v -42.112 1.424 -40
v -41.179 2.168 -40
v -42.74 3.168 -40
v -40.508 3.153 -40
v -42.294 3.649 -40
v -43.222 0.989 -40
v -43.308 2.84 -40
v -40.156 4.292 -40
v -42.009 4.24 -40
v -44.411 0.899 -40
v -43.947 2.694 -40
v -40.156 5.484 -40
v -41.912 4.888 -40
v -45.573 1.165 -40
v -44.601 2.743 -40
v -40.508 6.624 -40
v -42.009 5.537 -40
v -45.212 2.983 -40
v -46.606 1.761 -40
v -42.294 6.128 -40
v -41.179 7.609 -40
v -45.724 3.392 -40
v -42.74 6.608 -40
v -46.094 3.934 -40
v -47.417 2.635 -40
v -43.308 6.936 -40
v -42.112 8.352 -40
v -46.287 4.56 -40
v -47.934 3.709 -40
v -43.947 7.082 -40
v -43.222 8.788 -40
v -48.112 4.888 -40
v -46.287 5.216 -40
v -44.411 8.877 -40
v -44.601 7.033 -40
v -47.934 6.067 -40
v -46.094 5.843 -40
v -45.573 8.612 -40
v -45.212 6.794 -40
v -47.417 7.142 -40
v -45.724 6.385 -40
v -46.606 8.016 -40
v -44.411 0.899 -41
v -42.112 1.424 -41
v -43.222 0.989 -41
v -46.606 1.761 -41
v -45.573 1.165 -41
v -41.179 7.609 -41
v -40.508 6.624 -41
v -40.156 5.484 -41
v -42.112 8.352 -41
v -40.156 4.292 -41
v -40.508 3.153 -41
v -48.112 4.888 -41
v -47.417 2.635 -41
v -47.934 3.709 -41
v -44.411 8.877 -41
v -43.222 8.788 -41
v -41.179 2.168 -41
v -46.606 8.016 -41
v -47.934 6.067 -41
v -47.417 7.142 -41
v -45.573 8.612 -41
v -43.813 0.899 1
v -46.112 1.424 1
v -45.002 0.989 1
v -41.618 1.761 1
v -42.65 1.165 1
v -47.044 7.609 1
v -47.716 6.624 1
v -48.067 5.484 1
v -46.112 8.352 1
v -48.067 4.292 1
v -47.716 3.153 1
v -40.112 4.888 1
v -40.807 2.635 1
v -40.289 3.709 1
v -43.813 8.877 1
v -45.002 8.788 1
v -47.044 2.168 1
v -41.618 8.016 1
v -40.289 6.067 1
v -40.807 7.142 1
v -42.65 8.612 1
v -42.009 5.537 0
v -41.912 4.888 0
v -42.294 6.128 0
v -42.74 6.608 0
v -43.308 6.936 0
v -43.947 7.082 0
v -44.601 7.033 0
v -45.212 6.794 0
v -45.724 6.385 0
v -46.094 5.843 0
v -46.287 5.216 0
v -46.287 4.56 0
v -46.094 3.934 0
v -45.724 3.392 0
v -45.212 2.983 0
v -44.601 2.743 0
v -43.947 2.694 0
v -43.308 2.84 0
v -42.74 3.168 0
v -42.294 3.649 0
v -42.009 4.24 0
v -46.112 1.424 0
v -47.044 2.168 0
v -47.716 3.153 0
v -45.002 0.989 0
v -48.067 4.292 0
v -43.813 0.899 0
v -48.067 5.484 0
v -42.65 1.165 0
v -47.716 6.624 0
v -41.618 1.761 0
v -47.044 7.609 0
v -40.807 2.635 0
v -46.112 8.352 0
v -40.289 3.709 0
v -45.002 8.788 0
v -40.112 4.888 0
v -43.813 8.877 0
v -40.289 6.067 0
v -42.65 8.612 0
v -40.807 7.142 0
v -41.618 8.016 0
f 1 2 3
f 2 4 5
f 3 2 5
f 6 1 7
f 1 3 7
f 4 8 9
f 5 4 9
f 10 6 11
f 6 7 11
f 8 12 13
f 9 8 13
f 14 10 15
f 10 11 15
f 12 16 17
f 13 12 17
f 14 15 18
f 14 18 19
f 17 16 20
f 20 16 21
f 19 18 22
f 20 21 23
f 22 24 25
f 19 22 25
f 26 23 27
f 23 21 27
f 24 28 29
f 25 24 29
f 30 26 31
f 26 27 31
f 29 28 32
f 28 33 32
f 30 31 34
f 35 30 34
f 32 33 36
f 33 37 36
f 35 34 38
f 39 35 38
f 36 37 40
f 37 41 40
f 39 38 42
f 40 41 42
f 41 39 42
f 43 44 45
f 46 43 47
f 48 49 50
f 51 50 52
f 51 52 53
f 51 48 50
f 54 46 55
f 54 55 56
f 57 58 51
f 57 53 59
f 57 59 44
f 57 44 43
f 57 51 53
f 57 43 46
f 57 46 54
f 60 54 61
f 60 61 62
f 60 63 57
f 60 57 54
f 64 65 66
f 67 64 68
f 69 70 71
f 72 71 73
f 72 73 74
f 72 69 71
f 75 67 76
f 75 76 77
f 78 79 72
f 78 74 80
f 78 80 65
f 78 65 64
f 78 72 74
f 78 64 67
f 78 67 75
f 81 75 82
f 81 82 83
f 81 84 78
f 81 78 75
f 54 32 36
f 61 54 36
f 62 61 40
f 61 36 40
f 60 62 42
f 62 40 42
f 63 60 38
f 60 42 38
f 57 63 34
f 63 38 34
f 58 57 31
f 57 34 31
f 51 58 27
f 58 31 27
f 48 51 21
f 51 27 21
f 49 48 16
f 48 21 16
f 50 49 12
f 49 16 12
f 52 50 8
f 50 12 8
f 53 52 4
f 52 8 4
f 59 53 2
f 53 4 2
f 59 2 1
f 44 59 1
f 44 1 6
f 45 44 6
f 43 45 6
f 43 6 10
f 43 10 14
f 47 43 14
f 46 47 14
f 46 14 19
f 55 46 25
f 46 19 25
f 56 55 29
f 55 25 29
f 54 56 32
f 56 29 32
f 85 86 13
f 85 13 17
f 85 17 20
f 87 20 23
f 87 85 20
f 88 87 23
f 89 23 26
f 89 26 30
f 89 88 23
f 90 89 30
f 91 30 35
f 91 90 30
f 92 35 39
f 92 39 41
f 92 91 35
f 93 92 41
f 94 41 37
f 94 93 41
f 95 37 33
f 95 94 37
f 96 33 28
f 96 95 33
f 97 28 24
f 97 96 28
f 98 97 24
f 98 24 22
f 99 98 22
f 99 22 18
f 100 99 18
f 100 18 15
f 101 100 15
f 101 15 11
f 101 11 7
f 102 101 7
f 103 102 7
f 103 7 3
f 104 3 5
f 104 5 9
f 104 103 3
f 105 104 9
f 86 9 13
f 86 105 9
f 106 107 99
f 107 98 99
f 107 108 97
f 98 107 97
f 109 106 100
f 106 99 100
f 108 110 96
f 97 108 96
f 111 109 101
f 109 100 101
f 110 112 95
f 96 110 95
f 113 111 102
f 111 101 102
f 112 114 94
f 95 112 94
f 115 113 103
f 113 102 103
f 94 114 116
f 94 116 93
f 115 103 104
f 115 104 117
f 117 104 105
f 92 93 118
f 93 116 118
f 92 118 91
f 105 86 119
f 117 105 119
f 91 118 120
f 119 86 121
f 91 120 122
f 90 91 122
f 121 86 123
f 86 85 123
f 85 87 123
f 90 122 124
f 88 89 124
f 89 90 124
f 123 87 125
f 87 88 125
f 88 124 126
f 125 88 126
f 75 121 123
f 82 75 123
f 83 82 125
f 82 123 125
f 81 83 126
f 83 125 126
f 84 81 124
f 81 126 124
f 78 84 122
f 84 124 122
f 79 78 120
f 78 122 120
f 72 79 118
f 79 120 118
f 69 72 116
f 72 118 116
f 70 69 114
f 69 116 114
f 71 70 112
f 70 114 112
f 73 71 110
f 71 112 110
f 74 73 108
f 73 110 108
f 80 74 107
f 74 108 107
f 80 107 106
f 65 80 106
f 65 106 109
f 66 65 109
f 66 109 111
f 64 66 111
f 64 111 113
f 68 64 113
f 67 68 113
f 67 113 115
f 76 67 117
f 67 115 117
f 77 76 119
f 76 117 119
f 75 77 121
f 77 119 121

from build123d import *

# Parameters (mm, degrees)
SKETCH1_R           = 2.2
BOSS_EXTRUDE1_DEPTH = 40
SKETCH2_R           = 4
BOSS_EXTRUDE2_DEPTH = 1
SKETCH3_R           = 4
BOSS_EXTRUDE3_DEPTH = 1


with BuildPart() as part:
    # Sketch1 → Boss-Extrude1 (new body)
    with BuildSketch(Plane.XY):
        with Locations((-44.111688034, 4.888301887)):
            Circle(SKETCH1_R)
    extrude(amount=-BOSS_EXTRUDE1_DEPTH)

    # Sketch2 → Boss-Extrude2 (add)
    with BuildSketch(Plane.XY):
        with Locations((-44.111688034, 4.888301887)):
            Circle(SKETCH2_R)
    extrude(amount=BOSS_EXTRUDE2_DEPTH)

    # Sketch3 → Boss-Extrude3 (add)
    with BuildSketch(Plane(origin=(0, 0, -40), x_dir=(-1, 0, 0), z_dir=(0, 0, -1))):
        with Locations((44.111688034, 4.888301887)):
            Circle(SKETCH3_R)
    extrude(amount=BOSS_EXTRUDE3_DEPTH)


solid = part.part
